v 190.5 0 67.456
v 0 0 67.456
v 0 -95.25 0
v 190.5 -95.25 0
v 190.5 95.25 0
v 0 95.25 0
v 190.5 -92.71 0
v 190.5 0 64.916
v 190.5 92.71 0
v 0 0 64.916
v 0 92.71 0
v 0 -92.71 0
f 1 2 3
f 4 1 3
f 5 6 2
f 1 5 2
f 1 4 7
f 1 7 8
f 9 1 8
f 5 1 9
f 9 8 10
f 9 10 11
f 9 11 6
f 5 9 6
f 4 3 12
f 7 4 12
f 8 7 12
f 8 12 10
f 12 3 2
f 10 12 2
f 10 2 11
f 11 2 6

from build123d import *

# Parameters (mm, degrees)
F1_DEPTH = 190.5


with BuildPart() as f1:
    # F0 (on Right) → F1 (new body)
    with BuildSketch(Plane.YZ):
        Polygon((0, 67.456241), (-95.25, 0), (-92.71, 0), (0, 64.916241), align=None)
        Polygon((95.25, 0), (0, 67.456241), (0, 64.916241), (92.71, 0), align=None)
    extrude(amount=F1_DEPTH)


solid = f1.part
